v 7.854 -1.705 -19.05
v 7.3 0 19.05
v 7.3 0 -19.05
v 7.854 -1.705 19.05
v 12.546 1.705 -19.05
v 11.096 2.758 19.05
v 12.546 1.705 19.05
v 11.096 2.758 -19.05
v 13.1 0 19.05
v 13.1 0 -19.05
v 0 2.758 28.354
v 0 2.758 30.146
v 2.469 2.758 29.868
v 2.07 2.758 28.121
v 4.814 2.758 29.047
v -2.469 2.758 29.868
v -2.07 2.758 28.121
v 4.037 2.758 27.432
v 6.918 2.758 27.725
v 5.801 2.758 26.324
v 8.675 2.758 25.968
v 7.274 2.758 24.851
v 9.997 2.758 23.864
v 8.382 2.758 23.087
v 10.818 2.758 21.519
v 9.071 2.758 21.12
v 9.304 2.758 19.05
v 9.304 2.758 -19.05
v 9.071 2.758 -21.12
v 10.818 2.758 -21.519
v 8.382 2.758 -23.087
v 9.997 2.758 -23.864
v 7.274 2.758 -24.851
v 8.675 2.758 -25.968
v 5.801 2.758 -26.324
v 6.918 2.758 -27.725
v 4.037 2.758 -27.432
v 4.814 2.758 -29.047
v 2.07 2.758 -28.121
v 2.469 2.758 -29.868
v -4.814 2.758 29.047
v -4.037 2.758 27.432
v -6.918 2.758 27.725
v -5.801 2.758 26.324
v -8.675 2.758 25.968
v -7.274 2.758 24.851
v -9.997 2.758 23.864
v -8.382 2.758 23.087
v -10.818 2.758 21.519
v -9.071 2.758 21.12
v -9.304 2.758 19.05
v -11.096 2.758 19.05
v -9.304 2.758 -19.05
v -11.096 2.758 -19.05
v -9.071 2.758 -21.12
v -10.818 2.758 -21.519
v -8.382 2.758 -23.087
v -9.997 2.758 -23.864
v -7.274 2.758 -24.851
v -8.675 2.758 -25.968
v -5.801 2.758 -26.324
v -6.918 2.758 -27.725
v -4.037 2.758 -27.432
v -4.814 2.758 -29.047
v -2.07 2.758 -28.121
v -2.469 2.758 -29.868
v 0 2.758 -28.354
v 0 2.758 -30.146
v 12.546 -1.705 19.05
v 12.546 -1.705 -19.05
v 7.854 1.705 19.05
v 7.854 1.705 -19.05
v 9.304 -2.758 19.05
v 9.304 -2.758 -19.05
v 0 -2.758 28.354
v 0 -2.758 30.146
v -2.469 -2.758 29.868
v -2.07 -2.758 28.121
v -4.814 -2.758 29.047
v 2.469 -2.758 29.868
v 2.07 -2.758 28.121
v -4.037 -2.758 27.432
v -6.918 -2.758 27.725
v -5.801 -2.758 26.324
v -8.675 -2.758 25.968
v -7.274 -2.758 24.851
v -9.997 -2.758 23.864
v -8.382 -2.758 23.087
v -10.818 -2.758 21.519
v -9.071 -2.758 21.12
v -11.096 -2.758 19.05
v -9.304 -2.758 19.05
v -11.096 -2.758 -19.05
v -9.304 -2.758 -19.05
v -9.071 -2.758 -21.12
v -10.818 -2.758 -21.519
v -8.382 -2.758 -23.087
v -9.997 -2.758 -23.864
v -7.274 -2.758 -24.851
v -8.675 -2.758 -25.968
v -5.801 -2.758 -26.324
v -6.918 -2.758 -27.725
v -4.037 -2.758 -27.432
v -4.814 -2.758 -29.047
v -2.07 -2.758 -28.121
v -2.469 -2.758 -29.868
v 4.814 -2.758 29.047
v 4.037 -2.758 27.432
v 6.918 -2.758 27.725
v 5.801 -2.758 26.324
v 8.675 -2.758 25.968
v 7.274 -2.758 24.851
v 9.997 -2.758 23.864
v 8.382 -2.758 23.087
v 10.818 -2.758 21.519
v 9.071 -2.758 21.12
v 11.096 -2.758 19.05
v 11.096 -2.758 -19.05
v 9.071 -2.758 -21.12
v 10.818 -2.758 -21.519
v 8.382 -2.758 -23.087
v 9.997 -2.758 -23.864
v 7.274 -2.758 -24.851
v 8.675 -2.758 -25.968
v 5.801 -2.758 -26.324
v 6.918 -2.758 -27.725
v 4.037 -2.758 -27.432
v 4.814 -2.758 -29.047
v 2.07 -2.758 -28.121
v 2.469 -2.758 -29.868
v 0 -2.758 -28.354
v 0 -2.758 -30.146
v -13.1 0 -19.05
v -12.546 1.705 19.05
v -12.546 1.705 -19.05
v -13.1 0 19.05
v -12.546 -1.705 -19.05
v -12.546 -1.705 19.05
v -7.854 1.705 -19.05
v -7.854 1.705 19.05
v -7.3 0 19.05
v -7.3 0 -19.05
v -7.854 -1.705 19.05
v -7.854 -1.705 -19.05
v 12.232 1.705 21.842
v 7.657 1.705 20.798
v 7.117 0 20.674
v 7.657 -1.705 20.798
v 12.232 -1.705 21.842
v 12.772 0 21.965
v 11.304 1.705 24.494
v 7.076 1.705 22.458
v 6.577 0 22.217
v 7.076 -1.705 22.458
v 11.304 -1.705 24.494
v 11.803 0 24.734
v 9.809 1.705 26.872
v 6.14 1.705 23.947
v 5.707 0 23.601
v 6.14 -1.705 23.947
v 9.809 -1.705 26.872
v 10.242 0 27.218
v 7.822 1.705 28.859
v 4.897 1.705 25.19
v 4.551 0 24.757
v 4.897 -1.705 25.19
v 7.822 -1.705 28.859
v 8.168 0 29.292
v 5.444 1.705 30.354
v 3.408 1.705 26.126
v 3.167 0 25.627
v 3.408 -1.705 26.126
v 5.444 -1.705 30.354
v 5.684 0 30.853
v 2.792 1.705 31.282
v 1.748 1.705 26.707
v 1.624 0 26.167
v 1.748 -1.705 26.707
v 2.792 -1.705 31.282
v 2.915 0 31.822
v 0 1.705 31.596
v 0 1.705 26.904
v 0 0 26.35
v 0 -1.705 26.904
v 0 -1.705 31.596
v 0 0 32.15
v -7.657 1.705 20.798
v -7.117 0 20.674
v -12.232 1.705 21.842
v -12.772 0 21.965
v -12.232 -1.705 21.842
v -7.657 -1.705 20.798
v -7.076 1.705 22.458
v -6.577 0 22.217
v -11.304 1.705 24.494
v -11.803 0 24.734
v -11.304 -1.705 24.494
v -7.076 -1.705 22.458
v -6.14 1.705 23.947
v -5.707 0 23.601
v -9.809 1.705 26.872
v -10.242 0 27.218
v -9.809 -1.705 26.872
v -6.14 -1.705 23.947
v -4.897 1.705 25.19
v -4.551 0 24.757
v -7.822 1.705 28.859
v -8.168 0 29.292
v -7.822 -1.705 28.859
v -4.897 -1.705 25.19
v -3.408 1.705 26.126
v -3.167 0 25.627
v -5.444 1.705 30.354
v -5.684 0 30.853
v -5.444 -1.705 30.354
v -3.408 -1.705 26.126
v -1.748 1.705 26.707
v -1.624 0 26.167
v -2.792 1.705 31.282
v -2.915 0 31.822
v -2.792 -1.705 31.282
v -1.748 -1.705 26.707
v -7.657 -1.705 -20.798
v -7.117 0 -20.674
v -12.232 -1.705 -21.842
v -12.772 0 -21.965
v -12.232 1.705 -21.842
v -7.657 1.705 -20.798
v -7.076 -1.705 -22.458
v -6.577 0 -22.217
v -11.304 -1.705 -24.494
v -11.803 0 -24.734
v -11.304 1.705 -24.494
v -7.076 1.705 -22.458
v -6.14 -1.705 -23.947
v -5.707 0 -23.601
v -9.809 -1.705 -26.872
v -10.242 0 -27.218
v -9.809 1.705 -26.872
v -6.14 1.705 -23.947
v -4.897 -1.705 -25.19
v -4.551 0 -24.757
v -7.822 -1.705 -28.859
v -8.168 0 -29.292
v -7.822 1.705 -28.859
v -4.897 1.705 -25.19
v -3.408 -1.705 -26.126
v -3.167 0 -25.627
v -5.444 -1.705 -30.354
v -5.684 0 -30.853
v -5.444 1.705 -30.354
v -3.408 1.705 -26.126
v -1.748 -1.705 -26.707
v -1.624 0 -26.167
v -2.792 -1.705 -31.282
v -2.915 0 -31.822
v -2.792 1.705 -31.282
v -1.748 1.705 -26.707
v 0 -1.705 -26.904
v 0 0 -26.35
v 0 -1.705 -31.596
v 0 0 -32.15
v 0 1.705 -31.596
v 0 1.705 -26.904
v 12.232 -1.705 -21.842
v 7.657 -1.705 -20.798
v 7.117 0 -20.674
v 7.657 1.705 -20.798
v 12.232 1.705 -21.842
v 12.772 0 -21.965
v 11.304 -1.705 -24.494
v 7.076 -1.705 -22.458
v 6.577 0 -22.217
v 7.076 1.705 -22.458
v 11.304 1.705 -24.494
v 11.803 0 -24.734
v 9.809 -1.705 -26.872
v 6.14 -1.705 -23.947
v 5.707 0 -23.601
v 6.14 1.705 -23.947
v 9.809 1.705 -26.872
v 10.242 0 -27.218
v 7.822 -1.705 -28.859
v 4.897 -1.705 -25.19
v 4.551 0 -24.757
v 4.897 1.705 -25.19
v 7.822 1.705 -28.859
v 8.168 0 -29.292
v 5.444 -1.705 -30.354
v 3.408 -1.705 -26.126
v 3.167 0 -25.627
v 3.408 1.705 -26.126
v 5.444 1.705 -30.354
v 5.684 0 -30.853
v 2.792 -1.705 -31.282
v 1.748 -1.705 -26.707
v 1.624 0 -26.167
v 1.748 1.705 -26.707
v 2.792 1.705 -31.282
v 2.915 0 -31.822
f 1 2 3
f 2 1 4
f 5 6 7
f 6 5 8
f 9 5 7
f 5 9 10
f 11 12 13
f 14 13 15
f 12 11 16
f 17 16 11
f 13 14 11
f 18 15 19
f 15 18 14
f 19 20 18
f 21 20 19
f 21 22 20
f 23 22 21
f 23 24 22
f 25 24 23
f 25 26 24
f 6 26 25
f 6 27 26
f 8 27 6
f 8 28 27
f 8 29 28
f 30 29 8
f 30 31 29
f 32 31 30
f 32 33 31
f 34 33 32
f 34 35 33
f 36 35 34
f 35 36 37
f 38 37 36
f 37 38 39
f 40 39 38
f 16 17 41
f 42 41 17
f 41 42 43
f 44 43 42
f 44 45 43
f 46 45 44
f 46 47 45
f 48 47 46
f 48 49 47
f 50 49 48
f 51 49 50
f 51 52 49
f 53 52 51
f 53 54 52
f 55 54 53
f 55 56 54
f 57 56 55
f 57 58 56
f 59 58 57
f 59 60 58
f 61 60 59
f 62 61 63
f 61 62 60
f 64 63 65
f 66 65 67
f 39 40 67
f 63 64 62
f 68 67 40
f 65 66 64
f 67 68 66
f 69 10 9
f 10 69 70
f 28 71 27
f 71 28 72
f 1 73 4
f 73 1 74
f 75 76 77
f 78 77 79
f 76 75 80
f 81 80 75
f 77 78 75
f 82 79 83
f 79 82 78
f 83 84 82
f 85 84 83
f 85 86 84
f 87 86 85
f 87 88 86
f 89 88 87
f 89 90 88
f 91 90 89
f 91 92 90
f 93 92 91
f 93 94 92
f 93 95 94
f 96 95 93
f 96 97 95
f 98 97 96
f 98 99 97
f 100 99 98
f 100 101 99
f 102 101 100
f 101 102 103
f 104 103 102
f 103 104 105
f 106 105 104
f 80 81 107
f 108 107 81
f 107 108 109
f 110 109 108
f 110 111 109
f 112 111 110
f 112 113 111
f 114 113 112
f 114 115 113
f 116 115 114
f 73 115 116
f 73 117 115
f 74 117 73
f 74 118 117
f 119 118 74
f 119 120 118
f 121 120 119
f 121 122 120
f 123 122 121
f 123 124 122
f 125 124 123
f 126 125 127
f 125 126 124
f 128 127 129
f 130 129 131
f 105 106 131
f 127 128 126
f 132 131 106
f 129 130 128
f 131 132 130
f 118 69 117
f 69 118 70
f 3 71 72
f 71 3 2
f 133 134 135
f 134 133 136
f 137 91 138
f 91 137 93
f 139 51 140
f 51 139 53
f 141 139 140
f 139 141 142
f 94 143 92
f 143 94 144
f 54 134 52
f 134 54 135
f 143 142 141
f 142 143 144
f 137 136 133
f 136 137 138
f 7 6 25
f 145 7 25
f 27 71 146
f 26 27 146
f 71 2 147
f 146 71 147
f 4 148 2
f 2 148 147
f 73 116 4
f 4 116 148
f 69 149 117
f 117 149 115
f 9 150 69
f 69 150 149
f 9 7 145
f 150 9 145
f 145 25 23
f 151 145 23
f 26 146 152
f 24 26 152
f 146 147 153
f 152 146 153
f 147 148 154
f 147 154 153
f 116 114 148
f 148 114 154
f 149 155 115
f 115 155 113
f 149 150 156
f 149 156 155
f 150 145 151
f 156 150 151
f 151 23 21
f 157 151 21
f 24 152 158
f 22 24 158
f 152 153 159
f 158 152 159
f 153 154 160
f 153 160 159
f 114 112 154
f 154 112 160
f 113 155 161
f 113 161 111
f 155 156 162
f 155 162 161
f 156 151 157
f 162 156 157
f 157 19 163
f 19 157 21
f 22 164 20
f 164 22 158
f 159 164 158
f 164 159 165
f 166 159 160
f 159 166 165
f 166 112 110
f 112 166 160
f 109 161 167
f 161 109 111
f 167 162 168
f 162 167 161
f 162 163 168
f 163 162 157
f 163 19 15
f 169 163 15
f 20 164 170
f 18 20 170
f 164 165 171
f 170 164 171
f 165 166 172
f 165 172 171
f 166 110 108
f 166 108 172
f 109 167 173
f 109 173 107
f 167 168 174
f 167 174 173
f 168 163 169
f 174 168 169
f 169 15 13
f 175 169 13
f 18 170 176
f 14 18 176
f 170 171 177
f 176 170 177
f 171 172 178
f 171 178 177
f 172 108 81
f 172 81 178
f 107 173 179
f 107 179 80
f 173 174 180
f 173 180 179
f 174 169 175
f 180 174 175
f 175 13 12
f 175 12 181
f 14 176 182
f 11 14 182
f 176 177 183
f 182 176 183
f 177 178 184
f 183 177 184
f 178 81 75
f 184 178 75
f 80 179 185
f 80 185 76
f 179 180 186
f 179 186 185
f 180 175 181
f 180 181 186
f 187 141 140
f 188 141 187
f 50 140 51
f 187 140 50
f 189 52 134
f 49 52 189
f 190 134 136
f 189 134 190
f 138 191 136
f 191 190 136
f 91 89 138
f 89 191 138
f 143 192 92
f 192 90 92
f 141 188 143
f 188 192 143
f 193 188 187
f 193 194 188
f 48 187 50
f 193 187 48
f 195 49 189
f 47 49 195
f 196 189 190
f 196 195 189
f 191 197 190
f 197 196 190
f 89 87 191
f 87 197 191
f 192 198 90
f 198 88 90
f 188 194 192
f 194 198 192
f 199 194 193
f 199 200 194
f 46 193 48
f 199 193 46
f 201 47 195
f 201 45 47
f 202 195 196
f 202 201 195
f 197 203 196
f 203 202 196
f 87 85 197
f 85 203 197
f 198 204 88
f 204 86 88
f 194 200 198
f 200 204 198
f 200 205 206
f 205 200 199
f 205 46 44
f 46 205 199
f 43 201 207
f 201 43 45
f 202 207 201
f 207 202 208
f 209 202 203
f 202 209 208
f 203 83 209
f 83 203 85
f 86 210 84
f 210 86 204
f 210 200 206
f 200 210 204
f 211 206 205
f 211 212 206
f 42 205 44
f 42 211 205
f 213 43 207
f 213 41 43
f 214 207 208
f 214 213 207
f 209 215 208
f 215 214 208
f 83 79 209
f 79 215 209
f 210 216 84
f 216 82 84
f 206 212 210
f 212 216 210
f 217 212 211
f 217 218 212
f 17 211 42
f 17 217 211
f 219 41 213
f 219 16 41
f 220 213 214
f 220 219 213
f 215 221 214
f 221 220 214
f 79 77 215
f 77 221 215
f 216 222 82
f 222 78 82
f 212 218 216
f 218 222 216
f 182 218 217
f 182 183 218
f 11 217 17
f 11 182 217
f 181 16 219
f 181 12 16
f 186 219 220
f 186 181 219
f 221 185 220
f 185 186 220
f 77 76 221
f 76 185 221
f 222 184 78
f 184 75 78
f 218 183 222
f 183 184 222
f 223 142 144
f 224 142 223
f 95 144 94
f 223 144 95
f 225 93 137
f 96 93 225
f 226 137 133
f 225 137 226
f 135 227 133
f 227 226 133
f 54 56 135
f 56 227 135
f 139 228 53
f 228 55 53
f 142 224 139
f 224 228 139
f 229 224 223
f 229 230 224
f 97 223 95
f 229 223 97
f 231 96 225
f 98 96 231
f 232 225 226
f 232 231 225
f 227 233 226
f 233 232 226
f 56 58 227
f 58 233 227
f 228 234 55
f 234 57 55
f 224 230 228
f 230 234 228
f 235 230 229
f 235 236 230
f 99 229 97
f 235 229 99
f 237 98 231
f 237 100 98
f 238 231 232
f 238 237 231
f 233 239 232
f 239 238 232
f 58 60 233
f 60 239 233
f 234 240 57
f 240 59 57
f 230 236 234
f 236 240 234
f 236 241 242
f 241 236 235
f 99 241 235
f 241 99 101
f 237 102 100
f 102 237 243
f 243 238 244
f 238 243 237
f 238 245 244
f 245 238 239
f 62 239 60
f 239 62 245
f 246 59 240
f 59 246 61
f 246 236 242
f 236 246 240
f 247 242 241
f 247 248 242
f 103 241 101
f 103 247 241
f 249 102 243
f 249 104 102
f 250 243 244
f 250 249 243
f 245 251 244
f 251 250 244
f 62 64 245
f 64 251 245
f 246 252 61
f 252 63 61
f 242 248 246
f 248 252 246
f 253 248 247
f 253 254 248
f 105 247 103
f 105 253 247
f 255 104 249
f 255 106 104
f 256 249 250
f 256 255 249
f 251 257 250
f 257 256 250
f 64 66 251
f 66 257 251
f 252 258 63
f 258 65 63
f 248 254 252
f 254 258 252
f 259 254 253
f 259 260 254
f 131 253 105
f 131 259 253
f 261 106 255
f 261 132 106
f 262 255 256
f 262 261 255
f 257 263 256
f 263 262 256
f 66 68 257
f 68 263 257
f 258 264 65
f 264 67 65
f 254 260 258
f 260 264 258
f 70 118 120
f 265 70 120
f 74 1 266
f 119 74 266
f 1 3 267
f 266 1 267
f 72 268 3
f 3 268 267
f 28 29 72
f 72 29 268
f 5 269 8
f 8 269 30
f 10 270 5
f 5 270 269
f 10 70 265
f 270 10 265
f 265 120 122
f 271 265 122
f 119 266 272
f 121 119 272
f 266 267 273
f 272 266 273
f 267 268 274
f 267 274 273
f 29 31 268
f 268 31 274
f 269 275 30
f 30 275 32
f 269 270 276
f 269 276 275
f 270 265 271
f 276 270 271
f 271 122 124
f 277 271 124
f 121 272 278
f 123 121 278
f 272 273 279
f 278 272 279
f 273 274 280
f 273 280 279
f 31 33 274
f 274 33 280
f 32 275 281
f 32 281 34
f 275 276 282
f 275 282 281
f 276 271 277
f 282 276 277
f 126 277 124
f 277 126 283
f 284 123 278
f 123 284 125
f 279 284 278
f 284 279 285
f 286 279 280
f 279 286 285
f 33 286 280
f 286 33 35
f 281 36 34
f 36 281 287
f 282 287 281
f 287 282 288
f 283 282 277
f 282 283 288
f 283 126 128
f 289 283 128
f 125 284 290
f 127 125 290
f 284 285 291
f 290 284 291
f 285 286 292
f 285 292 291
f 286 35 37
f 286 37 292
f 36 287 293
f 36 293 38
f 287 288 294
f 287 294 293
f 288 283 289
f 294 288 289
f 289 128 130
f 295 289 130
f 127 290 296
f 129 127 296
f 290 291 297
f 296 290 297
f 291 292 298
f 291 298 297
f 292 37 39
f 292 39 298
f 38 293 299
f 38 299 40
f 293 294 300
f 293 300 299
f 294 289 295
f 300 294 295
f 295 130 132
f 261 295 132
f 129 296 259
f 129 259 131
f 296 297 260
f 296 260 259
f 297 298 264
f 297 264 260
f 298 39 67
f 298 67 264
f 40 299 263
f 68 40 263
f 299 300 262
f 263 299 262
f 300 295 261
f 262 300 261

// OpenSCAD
union() {
    
    translate([7.3 + 2.9,0,0]) 
        cylinder(h=64.3 - 26.2, r=2.9, center=true);
    translate([-7.3 - 2.9   ,0,0]) 
        cylinder(h=64.3 - 26.2, r=2.9, center=true);

    translate([0,0,32.15 - 2.9 - 10.2]) 
    rotate(a=90,v=[1,0, 0]) 
    rotate_extrude(angle=90, convexity=10)
        translate([10.2, 0]) circle(2.9);
    
    translate([0,0,32.15 - 2.9 - 10.2]) 
    rotate(a=270,v=[1,0, 0]) 
    rotate_extrude(angle=90, convexity=10)
        translate([-10.2, 0]) circle(2.9);
    
    translate([0,0,-32.15 + 2.9 + 10.2]) 
    rotate(a=90,v=[1,0, 0]) 
    rotate_extrude(angle=90, convexity=10)
        translate([-10.2, 0]) circle(2.9);
    
    translate([0,0,-32.15 + 2.9 + 10.2]) 
    rotate(a=270,v=[1,0, 0]) 
    rotate_extrude(angle=90, convexity=10)
        translate([10.2, 0]) circle(2.9);
}
